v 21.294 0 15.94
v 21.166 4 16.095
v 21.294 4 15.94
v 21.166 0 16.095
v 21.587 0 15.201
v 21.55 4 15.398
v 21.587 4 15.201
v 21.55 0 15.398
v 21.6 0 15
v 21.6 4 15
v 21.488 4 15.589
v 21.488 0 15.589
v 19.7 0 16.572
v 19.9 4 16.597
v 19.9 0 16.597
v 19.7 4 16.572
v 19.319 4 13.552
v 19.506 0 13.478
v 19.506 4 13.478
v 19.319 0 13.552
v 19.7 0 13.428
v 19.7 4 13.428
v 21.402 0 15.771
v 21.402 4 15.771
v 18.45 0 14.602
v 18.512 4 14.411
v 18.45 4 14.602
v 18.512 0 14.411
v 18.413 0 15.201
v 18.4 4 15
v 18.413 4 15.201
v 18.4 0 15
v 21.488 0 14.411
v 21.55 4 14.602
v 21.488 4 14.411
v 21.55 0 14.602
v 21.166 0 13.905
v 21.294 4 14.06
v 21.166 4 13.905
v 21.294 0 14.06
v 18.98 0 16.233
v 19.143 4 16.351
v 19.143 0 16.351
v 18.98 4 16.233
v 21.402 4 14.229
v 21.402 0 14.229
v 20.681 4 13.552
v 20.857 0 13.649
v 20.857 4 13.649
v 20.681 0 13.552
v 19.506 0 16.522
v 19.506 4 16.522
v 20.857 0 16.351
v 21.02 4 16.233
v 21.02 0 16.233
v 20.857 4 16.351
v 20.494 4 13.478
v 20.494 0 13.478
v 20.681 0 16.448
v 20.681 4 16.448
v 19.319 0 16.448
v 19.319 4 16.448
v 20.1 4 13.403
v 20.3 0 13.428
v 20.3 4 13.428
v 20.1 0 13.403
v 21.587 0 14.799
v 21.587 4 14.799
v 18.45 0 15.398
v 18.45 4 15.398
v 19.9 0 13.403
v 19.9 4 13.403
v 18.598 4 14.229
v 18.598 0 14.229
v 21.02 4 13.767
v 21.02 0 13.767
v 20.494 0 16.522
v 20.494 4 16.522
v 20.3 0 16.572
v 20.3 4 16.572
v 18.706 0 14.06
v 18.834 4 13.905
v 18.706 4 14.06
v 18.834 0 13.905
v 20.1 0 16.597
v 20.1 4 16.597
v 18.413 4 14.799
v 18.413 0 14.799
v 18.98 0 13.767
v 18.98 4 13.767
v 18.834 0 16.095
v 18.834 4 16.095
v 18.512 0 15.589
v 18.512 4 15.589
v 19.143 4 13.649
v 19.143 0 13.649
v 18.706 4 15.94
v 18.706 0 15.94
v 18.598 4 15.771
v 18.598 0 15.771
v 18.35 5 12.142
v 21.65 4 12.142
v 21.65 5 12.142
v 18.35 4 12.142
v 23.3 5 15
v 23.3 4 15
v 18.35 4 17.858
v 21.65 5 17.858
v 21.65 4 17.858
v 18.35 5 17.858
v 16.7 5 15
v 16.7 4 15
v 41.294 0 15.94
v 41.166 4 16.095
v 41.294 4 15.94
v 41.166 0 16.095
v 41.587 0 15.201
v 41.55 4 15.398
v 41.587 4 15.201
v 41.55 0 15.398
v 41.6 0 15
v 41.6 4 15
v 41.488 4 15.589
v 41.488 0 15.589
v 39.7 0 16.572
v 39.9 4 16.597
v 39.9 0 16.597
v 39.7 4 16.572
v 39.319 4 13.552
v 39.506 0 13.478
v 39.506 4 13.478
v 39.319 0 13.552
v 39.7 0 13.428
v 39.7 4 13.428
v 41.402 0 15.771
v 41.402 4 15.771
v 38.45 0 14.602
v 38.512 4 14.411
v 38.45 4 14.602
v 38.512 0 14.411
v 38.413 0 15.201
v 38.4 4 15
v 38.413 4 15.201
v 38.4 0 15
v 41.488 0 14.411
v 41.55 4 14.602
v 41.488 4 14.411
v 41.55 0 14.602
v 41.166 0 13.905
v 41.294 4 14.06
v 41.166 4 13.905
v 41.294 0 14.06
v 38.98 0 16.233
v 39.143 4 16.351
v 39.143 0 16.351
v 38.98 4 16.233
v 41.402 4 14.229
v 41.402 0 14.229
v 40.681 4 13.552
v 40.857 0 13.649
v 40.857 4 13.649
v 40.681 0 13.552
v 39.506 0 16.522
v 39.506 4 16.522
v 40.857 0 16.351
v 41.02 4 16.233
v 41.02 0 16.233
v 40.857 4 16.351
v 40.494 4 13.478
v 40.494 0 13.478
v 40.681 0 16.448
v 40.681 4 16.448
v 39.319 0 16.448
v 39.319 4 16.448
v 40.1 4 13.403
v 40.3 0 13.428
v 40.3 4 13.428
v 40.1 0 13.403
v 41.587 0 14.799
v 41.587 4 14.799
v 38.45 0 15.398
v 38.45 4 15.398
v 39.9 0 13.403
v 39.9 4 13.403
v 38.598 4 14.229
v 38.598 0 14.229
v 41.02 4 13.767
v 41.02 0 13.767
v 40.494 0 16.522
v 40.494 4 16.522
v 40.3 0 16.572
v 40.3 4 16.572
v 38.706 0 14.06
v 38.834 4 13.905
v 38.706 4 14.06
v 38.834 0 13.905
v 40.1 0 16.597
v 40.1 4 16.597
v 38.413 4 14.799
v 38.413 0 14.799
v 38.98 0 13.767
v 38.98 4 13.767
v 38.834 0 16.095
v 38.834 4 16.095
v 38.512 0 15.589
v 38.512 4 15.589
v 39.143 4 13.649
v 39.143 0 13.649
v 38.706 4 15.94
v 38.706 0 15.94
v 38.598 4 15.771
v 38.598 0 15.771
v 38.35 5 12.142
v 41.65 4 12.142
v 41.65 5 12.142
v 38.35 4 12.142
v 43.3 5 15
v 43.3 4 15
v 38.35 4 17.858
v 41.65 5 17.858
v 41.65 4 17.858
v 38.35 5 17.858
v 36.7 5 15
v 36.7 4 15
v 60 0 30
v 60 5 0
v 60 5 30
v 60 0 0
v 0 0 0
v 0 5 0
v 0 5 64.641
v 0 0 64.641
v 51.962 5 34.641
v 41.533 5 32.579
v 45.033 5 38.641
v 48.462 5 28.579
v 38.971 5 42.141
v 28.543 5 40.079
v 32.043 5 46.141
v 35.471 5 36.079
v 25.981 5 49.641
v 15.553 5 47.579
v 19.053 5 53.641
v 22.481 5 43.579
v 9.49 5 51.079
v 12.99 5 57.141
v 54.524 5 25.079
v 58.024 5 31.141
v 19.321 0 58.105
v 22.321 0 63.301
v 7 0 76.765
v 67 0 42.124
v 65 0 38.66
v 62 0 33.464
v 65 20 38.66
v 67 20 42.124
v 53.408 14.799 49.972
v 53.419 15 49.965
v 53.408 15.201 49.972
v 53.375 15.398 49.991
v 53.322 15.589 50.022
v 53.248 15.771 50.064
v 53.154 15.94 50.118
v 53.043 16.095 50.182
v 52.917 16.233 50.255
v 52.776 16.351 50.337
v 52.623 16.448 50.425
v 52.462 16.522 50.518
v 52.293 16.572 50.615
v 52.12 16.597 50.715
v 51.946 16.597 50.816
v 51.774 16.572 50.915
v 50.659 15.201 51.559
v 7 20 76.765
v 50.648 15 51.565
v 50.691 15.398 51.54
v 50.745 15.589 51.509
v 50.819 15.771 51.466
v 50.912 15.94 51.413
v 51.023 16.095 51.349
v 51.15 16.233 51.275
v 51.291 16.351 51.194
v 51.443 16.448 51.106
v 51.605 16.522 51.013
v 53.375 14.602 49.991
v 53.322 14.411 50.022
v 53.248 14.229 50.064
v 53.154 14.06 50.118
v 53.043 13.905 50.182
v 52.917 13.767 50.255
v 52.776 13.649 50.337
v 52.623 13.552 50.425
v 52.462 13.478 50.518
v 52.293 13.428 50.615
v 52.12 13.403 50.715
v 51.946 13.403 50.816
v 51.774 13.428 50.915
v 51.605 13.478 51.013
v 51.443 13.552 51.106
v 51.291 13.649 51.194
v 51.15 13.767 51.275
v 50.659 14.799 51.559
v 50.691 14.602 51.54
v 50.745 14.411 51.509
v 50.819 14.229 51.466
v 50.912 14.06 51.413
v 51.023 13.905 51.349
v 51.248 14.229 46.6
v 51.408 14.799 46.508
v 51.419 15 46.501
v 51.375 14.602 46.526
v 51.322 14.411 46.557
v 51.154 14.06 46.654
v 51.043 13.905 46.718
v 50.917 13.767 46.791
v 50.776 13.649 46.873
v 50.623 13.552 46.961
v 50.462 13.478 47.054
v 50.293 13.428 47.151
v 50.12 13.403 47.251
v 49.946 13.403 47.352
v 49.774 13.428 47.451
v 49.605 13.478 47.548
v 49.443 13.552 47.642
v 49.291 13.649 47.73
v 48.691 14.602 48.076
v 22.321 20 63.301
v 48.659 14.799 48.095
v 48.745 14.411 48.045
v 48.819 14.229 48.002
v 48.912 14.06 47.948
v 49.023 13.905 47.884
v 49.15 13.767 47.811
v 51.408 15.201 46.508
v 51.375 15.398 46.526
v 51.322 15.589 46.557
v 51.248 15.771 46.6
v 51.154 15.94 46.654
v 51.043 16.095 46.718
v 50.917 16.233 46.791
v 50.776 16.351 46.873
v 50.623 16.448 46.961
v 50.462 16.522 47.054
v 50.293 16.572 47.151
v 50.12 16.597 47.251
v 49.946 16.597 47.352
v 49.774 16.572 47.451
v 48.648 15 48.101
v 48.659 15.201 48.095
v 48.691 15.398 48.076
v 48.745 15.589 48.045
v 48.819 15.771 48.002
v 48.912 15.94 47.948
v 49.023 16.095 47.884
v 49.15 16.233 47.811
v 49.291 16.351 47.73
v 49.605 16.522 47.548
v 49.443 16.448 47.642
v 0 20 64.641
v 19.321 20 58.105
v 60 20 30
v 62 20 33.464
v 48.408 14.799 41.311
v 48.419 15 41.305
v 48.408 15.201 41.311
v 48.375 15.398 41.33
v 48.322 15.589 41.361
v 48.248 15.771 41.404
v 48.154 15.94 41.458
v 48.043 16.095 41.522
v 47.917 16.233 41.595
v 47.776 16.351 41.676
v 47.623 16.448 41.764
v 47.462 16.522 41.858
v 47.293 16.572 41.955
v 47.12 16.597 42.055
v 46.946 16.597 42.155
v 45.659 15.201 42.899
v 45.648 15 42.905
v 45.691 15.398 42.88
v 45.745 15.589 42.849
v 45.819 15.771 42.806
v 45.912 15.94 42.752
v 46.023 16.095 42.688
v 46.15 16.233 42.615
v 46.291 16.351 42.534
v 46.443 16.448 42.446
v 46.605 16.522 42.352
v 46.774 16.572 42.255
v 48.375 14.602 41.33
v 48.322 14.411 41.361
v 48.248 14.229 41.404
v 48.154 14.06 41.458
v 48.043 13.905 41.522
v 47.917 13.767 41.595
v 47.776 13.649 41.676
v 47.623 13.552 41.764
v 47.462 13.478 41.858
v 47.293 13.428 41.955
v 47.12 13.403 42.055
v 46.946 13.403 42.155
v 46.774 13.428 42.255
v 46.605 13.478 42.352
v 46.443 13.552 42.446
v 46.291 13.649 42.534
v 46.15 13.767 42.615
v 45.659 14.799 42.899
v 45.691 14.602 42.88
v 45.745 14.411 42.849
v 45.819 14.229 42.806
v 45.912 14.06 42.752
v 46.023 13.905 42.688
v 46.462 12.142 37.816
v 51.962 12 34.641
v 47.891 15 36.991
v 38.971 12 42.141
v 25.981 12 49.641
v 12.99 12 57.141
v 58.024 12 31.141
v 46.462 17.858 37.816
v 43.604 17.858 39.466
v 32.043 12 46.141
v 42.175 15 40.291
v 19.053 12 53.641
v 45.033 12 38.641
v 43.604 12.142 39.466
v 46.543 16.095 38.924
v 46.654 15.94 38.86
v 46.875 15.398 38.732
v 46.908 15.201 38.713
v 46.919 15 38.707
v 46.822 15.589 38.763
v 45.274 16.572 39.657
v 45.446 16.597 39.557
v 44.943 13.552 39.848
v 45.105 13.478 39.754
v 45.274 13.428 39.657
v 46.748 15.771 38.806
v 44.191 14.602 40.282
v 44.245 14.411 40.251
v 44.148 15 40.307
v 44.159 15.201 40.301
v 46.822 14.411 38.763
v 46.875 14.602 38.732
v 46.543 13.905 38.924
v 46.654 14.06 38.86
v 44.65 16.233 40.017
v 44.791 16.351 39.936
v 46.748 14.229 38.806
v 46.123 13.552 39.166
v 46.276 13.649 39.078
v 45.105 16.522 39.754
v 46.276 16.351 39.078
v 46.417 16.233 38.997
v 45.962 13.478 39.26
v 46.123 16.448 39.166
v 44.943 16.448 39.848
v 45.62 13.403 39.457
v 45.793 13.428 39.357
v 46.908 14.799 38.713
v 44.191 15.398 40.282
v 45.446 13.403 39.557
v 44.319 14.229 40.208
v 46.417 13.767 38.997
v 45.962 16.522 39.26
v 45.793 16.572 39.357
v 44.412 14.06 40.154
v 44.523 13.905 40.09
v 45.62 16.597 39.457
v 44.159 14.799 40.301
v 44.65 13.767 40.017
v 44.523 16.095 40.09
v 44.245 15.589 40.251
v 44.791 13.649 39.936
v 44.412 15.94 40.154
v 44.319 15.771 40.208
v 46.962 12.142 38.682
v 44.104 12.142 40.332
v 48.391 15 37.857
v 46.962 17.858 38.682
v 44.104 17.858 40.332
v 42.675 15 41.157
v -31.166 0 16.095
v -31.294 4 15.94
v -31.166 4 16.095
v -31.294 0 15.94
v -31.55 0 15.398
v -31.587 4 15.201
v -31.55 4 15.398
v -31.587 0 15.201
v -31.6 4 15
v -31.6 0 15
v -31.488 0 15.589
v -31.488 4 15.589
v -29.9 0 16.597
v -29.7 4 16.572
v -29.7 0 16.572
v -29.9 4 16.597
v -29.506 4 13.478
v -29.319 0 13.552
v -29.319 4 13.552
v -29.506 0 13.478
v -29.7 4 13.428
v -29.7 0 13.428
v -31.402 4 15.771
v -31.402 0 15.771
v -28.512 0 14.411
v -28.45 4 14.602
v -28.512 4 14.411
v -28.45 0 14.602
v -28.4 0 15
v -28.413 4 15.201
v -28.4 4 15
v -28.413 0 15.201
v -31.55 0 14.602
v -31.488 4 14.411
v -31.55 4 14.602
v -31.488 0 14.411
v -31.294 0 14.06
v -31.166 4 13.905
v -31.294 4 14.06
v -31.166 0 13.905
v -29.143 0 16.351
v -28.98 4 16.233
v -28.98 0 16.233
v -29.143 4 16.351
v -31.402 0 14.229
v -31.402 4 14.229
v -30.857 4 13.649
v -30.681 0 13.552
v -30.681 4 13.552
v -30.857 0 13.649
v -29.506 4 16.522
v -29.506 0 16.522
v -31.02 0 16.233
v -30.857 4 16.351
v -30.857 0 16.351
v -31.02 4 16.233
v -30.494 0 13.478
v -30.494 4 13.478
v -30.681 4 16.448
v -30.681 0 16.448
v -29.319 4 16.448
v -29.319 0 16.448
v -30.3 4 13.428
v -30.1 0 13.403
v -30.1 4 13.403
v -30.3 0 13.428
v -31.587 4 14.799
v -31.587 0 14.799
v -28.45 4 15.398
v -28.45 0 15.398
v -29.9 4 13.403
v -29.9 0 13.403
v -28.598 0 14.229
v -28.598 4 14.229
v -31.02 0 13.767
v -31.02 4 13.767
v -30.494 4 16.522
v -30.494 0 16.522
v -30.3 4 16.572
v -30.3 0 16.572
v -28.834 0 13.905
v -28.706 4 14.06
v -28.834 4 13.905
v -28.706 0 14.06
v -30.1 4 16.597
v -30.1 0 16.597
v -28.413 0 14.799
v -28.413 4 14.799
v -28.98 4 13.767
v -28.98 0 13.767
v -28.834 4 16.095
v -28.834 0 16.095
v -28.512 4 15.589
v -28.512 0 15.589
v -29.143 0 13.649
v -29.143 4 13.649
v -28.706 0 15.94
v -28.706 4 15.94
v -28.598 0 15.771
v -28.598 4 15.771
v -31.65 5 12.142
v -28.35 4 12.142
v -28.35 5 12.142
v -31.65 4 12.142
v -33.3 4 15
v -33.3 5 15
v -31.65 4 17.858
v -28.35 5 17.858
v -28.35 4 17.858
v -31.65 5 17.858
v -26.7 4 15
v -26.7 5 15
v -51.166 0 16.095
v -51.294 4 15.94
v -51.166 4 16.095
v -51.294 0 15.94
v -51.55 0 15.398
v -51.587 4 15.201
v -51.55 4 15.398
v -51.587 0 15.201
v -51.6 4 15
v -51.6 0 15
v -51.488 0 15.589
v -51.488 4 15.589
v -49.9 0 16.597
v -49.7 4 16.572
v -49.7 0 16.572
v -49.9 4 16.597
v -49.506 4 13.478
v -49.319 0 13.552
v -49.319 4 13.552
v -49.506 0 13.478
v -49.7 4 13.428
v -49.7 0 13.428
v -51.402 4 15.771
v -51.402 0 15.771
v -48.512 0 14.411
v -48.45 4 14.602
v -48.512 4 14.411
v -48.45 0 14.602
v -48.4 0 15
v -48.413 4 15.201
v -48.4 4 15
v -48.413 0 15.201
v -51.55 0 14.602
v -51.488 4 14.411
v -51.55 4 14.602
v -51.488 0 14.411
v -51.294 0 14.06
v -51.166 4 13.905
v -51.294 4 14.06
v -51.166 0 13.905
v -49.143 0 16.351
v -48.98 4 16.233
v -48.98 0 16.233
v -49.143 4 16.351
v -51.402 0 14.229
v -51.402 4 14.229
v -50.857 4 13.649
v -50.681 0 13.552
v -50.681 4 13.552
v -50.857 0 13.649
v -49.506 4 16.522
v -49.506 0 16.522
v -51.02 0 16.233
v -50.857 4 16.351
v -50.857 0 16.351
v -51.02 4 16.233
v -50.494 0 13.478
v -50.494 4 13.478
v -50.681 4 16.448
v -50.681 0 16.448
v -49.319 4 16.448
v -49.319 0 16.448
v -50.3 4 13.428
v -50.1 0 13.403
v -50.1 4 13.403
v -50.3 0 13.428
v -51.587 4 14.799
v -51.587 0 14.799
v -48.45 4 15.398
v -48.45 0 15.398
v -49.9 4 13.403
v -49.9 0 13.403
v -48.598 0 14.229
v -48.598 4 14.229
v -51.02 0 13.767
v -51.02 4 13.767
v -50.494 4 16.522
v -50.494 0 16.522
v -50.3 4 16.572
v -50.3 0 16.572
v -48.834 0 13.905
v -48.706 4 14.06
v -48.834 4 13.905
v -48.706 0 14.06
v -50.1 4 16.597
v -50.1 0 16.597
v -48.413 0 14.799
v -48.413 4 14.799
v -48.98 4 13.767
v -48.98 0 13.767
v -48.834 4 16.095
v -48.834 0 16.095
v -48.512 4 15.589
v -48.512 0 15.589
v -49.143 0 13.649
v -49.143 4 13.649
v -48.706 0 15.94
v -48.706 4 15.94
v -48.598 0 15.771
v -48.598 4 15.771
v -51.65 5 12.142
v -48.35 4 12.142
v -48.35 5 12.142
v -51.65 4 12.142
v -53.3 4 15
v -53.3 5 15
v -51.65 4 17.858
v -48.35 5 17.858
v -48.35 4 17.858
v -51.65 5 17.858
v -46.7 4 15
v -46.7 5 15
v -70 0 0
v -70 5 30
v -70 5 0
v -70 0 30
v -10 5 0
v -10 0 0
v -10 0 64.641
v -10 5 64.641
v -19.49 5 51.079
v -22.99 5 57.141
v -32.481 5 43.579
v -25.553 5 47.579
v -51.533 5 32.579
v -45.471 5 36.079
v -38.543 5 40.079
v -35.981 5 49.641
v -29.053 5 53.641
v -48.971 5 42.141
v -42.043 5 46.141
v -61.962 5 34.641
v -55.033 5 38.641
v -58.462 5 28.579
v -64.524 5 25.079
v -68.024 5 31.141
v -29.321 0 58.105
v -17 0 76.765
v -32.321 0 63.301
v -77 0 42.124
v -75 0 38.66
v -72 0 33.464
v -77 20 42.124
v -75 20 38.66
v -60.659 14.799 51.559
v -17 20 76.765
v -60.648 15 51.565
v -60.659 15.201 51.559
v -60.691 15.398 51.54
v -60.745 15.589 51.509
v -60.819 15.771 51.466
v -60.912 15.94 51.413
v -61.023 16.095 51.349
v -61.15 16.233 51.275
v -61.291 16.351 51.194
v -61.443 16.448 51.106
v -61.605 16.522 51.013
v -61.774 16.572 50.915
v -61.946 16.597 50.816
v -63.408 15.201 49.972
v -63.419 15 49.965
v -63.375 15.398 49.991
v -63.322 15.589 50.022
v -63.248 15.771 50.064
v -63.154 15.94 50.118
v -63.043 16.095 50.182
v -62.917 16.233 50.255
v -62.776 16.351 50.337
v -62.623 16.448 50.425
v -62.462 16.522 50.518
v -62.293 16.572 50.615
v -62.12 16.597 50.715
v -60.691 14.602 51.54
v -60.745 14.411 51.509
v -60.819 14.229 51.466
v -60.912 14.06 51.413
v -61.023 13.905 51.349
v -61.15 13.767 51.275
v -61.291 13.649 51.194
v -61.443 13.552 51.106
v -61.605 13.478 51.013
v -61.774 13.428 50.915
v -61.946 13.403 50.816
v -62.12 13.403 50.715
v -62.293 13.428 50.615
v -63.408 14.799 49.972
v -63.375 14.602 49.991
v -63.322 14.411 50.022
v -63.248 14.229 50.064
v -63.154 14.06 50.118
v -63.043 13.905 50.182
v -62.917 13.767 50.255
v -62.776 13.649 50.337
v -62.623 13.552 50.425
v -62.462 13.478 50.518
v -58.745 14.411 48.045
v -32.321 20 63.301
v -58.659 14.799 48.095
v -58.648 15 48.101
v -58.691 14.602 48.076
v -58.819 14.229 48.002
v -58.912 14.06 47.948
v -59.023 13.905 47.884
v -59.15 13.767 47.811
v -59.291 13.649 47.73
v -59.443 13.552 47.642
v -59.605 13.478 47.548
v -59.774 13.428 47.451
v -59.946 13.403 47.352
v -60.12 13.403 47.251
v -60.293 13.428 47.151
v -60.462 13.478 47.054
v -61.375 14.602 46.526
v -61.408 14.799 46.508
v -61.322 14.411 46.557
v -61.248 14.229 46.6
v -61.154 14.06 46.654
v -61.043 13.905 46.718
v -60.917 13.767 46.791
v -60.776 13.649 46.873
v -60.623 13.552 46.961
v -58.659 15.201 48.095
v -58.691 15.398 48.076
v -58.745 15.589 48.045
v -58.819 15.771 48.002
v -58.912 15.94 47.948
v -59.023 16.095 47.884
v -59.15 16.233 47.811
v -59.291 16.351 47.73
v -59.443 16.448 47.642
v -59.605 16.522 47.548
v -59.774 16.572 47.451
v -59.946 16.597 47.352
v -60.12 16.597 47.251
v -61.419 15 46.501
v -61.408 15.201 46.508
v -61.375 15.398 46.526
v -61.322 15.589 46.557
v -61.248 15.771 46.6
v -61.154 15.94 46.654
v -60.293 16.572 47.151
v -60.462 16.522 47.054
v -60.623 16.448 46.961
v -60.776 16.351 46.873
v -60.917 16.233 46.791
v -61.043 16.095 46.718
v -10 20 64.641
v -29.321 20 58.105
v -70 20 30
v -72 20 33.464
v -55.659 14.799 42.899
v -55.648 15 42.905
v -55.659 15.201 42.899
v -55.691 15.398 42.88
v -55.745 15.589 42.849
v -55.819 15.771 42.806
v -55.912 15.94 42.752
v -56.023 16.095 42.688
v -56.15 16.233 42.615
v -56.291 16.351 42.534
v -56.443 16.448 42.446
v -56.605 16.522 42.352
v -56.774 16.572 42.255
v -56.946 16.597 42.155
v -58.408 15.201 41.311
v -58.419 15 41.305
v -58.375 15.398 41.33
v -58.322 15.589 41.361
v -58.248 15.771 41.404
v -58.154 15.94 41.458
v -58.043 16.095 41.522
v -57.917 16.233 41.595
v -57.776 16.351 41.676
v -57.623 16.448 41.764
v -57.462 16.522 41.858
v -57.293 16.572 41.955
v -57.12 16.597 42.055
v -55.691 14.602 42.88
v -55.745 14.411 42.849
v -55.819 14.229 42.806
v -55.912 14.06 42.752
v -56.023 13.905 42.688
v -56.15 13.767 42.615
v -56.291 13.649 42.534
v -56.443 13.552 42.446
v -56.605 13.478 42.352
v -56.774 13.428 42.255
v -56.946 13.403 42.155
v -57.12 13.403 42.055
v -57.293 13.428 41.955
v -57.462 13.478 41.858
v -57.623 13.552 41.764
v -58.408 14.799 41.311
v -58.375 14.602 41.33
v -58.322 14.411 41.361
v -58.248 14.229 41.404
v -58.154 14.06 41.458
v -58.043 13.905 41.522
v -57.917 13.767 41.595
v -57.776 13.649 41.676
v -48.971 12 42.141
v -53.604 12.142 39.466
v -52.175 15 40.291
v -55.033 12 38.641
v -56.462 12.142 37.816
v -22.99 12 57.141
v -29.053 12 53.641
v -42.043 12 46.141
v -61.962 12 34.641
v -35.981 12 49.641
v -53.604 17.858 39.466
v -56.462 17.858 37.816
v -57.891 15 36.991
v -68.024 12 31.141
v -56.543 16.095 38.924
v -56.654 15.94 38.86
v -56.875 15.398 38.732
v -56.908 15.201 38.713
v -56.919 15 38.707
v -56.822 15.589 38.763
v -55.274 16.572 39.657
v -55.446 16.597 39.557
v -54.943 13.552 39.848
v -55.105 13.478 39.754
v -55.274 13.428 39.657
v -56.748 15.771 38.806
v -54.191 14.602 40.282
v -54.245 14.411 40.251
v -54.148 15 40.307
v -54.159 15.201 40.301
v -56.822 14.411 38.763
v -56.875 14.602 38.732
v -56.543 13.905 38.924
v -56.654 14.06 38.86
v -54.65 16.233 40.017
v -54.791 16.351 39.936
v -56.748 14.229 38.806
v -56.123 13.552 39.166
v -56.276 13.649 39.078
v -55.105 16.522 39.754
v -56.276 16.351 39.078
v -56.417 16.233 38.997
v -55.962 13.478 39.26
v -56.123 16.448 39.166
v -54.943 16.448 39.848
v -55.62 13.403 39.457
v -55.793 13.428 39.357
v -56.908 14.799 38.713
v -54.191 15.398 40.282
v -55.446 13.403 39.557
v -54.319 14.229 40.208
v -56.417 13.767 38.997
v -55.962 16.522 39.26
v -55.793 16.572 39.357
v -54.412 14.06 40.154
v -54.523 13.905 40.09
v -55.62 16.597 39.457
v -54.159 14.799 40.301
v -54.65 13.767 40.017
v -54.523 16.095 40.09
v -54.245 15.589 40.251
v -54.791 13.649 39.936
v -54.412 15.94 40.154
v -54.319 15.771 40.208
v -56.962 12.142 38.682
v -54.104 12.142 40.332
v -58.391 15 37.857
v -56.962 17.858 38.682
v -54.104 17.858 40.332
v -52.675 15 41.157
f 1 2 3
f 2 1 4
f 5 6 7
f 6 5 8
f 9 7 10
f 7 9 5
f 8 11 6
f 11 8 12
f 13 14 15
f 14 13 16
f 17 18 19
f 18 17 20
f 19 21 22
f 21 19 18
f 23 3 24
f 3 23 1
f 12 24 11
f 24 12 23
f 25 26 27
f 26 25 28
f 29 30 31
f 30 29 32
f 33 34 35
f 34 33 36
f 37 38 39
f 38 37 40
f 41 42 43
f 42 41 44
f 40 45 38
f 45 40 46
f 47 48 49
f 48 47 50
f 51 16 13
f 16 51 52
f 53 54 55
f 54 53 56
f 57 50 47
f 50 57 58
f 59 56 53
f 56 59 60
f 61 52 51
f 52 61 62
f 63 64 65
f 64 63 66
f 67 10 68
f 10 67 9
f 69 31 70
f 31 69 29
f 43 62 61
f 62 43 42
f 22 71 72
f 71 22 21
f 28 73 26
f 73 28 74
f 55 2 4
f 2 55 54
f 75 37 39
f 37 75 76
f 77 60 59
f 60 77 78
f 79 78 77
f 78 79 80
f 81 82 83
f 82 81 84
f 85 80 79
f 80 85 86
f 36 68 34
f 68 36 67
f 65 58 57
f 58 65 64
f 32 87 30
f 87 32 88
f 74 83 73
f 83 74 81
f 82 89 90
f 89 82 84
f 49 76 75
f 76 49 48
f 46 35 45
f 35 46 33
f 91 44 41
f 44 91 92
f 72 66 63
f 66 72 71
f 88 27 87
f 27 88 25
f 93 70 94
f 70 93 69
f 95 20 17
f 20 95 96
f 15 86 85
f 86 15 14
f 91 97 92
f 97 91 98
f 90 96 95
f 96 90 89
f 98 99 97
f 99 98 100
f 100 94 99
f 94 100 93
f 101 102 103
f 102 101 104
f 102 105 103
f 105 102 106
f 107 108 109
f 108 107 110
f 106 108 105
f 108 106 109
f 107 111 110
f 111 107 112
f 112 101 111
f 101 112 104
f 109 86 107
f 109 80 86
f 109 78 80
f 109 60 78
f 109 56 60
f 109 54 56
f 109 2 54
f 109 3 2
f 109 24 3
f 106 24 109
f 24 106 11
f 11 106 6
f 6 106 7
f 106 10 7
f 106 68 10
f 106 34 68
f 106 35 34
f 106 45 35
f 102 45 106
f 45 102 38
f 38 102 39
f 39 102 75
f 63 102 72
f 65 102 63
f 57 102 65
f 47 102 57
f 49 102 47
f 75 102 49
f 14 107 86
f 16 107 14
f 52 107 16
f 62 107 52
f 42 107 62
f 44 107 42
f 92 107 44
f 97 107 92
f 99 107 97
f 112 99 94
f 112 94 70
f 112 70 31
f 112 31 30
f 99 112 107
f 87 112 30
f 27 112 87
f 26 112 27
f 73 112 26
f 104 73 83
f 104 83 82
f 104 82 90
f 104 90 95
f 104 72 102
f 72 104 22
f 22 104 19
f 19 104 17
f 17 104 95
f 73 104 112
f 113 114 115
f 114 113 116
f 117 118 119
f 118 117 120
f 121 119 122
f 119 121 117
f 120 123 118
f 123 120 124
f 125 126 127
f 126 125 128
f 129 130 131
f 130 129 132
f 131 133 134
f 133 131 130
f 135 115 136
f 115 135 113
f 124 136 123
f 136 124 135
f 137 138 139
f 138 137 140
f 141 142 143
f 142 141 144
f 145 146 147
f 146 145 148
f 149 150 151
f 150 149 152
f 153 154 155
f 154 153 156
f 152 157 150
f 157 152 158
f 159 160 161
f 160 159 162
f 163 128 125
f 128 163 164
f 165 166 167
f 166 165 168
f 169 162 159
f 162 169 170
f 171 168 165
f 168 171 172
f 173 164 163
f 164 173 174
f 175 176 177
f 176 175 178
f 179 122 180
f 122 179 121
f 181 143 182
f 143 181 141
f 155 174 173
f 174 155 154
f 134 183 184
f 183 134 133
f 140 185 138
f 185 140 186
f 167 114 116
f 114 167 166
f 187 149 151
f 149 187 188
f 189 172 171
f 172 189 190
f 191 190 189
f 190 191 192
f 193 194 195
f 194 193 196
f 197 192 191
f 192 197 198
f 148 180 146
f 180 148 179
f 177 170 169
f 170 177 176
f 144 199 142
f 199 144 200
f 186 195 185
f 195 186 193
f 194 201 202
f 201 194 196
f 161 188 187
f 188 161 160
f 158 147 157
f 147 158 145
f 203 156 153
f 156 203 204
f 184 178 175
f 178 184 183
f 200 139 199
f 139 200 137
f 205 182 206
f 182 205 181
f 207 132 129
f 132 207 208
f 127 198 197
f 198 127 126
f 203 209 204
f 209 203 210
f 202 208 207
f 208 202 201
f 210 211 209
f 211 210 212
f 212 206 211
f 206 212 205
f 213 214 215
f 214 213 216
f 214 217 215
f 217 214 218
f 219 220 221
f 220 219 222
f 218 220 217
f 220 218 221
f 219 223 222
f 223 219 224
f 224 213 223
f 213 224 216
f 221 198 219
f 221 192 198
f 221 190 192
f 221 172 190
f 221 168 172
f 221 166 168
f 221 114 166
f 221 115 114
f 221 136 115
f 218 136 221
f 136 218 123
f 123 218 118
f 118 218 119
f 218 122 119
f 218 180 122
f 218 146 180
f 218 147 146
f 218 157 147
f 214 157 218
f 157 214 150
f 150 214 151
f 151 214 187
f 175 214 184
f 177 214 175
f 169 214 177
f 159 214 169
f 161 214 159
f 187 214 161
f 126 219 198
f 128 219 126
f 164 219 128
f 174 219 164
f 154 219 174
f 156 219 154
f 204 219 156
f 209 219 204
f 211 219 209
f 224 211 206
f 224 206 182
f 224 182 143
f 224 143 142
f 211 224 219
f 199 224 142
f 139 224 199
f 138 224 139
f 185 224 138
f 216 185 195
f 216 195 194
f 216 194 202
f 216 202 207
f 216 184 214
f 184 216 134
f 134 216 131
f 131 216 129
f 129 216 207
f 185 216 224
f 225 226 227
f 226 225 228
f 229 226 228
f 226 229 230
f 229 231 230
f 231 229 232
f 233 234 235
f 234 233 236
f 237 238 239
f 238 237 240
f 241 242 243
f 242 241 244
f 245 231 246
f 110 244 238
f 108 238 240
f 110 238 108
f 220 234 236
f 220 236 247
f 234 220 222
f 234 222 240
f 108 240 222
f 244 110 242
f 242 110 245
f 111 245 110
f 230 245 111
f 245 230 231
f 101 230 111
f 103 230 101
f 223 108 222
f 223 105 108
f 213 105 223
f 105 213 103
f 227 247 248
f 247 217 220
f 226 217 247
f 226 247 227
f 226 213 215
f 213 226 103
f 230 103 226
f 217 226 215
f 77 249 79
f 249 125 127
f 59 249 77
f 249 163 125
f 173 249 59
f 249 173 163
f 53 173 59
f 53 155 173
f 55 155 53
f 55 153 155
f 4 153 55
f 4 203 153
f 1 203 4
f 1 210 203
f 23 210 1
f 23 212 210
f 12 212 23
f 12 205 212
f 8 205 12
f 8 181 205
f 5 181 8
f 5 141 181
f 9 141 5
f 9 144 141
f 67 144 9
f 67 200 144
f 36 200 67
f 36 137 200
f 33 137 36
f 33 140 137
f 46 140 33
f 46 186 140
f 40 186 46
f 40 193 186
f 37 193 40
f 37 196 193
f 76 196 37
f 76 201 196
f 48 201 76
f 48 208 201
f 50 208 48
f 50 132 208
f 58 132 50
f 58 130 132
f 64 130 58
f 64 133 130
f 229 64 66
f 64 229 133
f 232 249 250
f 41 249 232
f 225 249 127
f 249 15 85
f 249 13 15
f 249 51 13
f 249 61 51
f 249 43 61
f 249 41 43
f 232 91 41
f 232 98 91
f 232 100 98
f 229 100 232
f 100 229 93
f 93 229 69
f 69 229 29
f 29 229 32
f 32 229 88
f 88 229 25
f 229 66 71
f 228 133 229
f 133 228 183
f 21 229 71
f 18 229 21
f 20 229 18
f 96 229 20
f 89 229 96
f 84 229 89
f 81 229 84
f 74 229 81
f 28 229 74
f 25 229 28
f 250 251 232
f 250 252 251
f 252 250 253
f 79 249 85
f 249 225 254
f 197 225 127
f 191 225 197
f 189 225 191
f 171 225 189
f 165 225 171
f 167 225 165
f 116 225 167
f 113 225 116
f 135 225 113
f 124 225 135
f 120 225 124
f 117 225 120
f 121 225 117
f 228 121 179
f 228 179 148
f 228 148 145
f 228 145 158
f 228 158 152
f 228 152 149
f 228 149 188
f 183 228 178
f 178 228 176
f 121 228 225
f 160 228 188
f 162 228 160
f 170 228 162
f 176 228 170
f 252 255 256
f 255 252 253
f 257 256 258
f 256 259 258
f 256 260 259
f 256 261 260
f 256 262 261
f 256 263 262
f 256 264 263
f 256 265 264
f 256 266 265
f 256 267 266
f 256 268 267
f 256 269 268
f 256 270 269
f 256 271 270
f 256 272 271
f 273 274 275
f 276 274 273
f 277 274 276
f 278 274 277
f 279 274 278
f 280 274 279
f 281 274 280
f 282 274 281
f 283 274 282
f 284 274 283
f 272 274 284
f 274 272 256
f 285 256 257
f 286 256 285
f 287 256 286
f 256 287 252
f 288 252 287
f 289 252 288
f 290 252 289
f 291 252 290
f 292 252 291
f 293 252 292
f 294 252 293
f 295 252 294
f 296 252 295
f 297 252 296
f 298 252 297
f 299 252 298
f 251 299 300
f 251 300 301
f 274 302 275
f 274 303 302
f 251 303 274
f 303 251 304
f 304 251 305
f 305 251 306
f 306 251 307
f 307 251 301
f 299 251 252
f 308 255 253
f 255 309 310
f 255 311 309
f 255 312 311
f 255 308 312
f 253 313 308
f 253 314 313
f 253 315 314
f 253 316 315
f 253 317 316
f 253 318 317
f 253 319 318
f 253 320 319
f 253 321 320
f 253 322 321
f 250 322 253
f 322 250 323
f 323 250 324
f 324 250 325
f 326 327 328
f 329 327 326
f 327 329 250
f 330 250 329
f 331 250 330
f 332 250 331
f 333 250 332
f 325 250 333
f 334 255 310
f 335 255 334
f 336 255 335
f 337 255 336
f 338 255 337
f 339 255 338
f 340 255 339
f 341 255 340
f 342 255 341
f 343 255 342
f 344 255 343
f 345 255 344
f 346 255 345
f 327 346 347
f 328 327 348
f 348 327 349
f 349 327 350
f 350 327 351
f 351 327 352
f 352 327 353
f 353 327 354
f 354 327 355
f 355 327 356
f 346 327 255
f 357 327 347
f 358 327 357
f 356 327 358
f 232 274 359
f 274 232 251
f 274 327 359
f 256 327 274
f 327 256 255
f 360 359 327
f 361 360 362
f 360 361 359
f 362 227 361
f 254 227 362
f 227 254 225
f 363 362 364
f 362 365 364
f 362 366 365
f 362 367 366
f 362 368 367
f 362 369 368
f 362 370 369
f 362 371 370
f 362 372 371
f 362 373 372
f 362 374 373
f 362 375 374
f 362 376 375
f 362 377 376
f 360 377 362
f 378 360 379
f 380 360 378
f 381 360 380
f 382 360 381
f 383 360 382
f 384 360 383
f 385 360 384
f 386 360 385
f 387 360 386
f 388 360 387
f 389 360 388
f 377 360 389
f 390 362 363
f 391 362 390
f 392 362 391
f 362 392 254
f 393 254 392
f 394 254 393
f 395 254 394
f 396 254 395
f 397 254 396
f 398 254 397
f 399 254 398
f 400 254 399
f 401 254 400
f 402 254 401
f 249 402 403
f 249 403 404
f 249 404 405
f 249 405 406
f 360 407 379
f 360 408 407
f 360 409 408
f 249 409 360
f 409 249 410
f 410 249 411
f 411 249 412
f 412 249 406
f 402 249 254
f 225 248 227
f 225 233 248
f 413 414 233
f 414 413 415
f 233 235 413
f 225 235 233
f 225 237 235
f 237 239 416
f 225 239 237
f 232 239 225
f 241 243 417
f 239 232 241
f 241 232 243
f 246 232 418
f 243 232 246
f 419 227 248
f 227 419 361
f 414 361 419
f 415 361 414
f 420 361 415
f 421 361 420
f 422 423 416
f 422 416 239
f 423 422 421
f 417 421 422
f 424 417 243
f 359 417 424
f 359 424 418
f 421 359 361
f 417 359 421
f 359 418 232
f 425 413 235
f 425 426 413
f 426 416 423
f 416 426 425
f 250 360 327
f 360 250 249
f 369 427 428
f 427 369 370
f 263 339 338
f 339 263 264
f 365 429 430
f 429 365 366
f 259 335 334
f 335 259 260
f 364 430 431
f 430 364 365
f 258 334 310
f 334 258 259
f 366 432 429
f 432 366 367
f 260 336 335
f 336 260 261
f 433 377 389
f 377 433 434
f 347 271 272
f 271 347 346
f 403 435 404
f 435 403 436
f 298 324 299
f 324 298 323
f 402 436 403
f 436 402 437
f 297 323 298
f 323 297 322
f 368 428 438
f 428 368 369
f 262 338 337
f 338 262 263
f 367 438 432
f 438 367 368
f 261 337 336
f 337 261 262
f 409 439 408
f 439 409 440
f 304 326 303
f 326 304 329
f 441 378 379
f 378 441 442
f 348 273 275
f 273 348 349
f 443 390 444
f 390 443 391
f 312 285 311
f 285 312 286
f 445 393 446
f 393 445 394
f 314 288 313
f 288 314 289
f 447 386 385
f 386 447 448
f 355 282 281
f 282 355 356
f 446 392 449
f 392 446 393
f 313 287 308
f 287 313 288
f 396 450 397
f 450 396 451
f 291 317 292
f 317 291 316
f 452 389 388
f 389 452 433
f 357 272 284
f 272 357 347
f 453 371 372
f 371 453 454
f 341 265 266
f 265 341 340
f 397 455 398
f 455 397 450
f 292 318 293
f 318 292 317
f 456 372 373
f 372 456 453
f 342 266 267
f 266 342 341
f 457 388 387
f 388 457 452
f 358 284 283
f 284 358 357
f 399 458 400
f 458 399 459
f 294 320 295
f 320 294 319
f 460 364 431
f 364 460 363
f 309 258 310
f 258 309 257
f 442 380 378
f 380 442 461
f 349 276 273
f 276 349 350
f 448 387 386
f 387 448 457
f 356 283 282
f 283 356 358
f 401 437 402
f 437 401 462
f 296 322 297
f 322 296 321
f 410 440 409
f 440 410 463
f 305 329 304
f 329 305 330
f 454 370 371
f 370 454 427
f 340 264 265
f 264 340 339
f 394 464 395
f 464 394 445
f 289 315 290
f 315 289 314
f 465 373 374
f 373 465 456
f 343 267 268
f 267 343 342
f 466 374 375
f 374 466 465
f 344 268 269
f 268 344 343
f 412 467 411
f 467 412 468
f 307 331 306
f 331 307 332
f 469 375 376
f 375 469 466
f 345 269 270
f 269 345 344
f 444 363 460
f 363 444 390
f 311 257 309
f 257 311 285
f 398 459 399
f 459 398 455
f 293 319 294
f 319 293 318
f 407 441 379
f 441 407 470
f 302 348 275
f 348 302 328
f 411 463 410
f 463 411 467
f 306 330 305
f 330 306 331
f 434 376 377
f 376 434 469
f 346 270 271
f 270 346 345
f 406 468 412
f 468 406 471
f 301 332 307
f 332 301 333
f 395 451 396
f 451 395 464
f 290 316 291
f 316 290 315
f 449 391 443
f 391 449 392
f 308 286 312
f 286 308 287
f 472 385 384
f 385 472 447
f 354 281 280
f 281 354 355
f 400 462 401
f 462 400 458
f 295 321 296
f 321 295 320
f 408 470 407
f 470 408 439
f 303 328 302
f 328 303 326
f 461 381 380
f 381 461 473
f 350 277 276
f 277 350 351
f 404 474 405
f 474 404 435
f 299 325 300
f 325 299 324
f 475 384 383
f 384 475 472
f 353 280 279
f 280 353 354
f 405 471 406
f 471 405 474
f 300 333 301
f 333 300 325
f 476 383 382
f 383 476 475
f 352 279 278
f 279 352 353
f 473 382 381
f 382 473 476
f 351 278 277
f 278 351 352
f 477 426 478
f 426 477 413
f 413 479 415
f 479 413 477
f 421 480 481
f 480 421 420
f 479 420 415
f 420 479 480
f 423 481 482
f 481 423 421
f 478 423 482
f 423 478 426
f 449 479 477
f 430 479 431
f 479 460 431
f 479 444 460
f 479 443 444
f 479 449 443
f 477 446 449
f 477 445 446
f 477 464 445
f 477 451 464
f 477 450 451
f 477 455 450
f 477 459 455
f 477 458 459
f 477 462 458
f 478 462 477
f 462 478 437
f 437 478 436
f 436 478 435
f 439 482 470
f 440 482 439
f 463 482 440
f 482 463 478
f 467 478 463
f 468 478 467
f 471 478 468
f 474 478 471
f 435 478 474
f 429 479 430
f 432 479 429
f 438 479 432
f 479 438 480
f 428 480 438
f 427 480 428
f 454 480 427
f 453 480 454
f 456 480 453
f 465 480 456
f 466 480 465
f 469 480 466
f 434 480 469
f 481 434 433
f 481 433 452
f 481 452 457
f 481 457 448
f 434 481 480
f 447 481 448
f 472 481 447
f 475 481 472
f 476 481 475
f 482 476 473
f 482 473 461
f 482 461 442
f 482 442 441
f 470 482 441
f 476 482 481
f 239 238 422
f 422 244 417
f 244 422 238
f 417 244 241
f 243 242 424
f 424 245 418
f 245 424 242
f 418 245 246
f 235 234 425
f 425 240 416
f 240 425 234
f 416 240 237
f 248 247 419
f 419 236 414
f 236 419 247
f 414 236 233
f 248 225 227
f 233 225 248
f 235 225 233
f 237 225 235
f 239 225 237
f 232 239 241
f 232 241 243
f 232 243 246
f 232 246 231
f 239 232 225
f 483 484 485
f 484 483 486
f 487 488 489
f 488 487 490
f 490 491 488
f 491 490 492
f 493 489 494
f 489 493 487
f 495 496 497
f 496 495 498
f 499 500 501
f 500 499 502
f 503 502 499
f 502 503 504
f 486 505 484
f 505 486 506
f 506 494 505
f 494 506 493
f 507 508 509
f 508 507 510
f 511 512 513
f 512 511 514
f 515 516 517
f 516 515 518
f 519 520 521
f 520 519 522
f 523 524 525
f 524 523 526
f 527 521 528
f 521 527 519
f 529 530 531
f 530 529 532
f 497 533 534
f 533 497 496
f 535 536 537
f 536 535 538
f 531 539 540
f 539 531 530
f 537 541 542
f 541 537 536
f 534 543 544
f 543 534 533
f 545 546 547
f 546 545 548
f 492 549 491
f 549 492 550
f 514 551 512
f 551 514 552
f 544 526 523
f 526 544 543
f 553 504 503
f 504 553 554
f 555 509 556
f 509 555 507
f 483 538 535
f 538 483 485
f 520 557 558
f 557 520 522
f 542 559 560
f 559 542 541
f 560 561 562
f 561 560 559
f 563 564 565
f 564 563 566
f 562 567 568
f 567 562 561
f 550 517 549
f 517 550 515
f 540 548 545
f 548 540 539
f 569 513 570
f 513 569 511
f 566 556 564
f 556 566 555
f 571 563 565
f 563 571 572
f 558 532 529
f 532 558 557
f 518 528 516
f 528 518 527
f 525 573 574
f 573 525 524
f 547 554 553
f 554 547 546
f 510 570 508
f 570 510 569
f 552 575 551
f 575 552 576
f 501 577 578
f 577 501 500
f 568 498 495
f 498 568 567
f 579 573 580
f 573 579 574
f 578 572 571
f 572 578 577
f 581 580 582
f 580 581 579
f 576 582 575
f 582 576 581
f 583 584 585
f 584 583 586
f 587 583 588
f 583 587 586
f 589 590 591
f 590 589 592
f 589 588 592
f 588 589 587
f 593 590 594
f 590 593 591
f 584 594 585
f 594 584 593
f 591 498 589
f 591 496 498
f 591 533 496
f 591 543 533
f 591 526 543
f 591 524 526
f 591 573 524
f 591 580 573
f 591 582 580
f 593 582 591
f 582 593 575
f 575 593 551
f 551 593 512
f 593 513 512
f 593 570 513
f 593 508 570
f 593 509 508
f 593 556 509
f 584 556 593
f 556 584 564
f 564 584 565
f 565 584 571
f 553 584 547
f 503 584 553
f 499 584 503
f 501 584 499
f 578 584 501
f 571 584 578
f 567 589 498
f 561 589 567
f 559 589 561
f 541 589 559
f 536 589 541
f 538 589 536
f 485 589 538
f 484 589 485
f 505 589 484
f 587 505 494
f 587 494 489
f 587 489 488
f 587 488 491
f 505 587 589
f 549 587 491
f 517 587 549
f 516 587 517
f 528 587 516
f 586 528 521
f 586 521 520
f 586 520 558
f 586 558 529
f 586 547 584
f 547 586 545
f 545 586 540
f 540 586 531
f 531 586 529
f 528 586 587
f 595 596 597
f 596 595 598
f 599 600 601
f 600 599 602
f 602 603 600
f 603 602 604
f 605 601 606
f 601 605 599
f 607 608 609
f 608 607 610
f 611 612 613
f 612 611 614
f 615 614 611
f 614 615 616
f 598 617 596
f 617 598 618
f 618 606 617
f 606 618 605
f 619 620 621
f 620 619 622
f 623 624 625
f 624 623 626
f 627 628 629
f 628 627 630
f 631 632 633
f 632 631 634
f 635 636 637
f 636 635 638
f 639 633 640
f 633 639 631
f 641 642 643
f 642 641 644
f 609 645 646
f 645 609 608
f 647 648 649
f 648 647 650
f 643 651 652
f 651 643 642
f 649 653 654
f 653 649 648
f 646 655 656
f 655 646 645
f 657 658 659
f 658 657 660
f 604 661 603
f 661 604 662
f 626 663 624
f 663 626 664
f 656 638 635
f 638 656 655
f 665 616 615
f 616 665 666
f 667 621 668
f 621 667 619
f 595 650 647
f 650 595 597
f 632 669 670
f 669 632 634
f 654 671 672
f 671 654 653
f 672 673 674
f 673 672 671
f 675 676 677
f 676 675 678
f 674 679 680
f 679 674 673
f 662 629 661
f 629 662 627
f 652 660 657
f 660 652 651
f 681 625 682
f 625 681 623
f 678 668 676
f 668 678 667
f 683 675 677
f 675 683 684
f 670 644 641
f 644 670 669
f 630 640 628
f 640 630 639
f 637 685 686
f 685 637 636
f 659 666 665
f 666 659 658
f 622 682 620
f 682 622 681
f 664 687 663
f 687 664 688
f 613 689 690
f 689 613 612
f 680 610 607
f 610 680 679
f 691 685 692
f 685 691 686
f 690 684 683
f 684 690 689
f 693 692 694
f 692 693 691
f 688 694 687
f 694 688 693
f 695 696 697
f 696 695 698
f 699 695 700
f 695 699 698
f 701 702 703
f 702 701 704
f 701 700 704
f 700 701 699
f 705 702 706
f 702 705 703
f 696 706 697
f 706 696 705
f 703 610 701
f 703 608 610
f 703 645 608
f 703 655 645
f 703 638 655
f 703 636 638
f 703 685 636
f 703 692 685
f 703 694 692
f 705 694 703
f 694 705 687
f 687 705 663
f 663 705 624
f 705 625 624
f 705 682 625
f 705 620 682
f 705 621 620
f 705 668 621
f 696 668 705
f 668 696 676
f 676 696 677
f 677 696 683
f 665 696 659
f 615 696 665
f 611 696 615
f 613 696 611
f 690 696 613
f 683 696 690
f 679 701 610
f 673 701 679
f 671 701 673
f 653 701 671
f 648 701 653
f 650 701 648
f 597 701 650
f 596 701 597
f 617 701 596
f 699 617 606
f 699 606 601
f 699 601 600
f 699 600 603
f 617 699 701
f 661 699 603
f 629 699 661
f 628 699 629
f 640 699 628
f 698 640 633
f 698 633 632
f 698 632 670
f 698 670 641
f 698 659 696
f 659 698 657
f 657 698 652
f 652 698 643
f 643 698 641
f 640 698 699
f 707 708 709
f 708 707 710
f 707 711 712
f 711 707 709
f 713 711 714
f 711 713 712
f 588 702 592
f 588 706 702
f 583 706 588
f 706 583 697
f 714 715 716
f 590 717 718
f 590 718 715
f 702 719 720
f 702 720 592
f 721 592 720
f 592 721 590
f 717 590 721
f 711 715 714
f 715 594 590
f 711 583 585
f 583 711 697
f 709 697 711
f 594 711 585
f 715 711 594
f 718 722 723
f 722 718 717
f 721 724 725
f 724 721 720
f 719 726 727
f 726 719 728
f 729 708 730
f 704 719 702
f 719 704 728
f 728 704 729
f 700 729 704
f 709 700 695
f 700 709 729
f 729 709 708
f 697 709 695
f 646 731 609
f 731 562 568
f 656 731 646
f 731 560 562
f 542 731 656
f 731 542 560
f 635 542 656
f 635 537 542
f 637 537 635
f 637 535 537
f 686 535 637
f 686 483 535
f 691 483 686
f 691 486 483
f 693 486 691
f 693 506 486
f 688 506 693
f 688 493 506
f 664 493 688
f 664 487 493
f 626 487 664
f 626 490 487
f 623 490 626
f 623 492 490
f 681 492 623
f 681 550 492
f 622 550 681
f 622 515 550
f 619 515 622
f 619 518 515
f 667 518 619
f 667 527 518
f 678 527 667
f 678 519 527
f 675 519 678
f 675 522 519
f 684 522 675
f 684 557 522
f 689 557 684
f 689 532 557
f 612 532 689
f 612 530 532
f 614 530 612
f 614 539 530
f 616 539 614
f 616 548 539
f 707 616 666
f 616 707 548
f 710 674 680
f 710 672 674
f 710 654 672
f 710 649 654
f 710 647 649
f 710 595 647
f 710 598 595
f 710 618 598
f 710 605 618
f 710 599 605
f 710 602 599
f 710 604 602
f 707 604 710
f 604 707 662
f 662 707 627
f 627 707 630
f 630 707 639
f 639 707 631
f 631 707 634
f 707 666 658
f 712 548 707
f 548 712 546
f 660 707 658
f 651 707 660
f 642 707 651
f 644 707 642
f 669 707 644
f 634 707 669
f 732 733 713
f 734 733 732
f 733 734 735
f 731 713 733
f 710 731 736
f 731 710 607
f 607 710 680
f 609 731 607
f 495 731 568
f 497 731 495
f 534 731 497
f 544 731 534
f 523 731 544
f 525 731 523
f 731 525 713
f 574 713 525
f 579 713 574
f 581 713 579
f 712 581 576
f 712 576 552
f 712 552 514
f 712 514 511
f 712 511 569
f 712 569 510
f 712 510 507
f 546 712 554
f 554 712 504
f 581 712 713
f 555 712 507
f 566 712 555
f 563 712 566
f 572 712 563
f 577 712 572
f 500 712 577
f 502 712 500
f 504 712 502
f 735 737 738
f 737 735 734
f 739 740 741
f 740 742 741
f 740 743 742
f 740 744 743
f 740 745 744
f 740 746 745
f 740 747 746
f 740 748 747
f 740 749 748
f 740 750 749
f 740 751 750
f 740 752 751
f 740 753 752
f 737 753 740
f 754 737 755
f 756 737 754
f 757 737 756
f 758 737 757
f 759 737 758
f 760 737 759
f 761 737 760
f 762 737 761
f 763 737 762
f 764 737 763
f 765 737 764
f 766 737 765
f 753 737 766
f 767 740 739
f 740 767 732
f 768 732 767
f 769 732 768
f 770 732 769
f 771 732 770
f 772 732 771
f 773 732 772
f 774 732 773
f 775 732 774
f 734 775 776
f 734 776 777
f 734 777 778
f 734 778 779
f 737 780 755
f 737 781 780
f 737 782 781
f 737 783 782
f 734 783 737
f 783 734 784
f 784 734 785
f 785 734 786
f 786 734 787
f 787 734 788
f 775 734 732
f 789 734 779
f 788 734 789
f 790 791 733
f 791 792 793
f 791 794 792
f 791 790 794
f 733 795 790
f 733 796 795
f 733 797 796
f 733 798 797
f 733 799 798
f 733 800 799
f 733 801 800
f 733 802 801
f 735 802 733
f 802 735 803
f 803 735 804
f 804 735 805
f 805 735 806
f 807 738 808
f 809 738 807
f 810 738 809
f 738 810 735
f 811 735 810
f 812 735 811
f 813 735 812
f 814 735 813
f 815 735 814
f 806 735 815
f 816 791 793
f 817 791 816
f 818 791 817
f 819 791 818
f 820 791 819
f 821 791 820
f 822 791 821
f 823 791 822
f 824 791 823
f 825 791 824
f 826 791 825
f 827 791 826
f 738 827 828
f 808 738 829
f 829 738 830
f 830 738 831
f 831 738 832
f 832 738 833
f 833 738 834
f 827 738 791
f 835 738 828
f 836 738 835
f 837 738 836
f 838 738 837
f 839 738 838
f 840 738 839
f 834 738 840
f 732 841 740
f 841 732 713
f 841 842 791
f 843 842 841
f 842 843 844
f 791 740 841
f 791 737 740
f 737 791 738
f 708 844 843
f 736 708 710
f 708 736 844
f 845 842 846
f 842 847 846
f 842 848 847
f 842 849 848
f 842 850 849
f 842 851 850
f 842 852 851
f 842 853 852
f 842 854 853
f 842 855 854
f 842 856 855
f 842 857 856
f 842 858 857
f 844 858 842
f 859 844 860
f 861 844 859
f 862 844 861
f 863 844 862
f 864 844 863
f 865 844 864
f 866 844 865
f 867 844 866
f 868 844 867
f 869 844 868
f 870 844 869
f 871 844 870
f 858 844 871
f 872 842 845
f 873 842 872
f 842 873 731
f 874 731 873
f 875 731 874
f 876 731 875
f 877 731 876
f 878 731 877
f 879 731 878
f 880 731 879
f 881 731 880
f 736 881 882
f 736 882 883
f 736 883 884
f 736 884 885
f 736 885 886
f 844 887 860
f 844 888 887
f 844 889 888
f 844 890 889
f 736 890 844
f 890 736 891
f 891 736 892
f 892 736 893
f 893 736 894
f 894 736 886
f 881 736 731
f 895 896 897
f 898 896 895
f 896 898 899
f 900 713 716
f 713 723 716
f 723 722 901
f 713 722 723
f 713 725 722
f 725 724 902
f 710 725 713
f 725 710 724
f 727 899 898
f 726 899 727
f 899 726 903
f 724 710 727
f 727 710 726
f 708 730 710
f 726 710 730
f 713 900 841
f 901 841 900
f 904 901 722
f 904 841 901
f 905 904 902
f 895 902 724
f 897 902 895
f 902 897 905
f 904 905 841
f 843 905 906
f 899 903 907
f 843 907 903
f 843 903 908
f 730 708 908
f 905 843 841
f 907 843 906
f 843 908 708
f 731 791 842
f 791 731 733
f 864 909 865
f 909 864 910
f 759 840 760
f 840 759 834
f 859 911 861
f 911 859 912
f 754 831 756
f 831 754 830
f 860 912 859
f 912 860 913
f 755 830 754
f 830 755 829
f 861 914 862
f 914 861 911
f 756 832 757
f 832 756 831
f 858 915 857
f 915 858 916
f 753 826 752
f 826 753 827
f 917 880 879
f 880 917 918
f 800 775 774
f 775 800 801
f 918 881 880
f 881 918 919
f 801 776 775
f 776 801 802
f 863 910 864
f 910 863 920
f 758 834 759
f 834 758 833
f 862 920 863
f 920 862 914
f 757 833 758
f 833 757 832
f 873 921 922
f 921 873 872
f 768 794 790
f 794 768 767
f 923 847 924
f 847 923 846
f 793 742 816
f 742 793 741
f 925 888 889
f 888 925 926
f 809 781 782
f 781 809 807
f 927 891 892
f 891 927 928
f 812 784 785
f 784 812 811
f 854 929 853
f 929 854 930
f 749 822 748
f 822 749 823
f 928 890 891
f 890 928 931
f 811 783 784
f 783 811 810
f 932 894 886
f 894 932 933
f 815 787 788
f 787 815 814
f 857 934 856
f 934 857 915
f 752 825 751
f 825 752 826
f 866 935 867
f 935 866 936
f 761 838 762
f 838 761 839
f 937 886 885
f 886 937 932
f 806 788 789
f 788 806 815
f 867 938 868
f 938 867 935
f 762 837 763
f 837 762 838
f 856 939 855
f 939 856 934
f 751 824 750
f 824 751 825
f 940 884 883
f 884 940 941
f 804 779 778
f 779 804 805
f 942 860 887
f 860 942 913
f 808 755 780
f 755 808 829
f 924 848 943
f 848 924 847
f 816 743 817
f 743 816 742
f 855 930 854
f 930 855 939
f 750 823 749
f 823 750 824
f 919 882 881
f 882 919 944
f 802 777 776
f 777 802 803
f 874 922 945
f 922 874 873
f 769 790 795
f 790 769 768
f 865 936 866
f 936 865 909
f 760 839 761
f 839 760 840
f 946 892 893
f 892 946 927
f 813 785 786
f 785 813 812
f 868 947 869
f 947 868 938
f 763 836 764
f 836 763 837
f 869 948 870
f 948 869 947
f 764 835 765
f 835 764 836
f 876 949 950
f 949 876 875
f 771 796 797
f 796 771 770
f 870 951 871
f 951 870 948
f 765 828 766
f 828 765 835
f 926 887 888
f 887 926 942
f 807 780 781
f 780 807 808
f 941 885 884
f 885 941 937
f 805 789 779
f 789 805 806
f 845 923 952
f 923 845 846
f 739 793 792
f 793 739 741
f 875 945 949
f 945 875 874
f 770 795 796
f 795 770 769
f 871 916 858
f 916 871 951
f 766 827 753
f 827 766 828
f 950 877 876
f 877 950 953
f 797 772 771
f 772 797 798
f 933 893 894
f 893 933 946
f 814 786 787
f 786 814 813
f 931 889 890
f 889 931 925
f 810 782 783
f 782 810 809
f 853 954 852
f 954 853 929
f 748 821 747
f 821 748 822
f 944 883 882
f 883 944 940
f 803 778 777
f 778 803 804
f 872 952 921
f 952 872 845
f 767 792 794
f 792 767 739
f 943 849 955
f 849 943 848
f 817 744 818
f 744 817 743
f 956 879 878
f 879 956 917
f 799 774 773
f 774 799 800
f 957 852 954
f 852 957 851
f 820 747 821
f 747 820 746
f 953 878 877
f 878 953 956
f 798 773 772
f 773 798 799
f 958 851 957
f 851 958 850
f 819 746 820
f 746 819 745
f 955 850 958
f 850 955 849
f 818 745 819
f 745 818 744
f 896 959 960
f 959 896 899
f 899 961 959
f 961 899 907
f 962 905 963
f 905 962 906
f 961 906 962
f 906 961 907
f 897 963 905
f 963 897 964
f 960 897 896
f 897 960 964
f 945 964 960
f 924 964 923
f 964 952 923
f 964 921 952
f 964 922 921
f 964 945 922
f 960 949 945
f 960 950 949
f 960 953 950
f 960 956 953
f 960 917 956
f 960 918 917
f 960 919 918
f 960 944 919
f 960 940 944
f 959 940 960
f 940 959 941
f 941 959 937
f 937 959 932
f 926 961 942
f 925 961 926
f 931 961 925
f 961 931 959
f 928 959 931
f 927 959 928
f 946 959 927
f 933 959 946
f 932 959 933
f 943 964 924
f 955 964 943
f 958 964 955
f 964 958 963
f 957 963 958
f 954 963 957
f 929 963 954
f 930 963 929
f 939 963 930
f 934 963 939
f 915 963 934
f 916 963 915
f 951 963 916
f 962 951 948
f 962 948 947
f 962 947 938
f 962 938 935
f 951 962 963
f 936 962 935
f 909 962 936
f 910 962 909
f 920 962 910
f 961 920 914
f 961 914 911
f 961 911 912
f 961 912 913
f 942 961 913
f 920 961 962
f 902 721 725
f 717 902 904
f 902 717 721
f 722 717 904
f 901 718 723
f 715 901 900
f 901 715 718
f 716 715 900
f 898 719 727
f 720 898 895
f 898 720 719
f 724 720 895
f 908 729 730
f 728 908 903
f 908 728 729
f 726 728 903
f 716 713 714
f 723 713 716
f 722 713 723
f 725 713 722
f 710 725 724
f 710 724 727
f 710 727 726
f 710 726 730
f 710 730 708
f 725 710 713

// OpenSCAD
// source - https://en.wikibooks.org/wiki/OpenSCAD_User_Manual/Primitive_Solids#polyhedron
module prism(l, w, h){
	polyhedron(
    	points=[[0,0,0], [l,0,0], [l,w,0], [0,w,0], [0,w,h], [l,w,h]],
        faces=[[0,1,2,3],[5,4,3,2],[0,4,5,1],[0,3,4],[5,2,1]]
   );
}

// source - https://github.com/ThunderFly-aerospace/TF-G2/blob/5dd7c33e797f1e813cab132e38739af15a9d39a1/CAD/bolt_parameters.scad
screw_diameter = 3.2;
nut_diameter = 6.6;

angle = 30;
hldr_thickness = 5;
$fn = 50;

module HolderPanel() {
	thickness = 4;
	panel_thickness = 6;
	width = 20;
	hldr_length = 20;
	panel_margin = 10;
	length = 60;
	
	triangle_size = 7;

	difference() {
		union() {
			translate([0, 0, thickness + panel_thickness]) {
				cube([length / cos(angle), width, thickness]);
			}
			
			cube([length / cos(angle), width, thickness]);
			
			cube([hldr_length, width, 2 * thickness + panel_thickness]);
		}
		
		translate([hldr_length + 4 * (length - hldr_length) / 5, panel_margin + (width - panel_margin) / 2, -1]) {
			#cylinder(r = screw_diameter / 2, h = panel_thickness + thickness * 2 + 2);
			cylinder(r = nut_diameter / 2, h = 2, $fn = 6);
		}
	}

	translate([length/2, hldr_thickness + triangle_size, 0]) rotate ([180, 0, 0]) {
		prism(triangle_size, triangle_size, triangle_size);
	}
	translate([length/4, hldr_thickness + triangle_size, 0]) rotate ([180, 0, 0]) {
		prism(triangle_size, triangle_size, triangle_size);
	}
	translate([3*length/4, hldr_thickness + triangle_size, 0]) rotate ([180, 0, 0]) {
		prism(triangle_size, triangle_size, triangle_size);
	}
	translate([length, hldr_thickness + triangle_size, 0]) rotate ([180, 0, 0]) {
		prism(triangle_size, triangle_size, triangle_size);
	}

}

module SolarHolder() {
	height = 30;
	length = 60;
	prism_height = sqrt(3) / 3 * length;

	difference() {
		cube([length, hldr_thickness, height]);
		translate([length / 3, hldr_thickness + 1, height / 2]) rotate([90, 0, 0]) {
			#cylinder(r = screw_diameter / 2, h = hldr_thickness + 2);
			cylinder(r = nut_diameter / 2, h = 2, $fn = 6);
		}
		translate([2*length / 3, hldr_thickness + 1, height / 2]) rotate([90, 0, 0]) {
			#cylinder(r = screw_diameter / 2, h = hldr_thickness + 2);
			cylinder(r = nut_diameter / 2, h = 2, $fn = 6);
		}
	}

	translate([length, 0, height]) rotate([0, 0, 90]) {
		prism(hldr_thickness, length, prism_height);	
	}
	
	translate([0, 0, height + prism_height]) rotate([0, angle, 0]){
		HolderPanel();
	}
}

SolarHolder();

translate([-10, 0, 0]) mirror([1,0,0]) {
    SolarHolder();
}

//HolderPanel();
